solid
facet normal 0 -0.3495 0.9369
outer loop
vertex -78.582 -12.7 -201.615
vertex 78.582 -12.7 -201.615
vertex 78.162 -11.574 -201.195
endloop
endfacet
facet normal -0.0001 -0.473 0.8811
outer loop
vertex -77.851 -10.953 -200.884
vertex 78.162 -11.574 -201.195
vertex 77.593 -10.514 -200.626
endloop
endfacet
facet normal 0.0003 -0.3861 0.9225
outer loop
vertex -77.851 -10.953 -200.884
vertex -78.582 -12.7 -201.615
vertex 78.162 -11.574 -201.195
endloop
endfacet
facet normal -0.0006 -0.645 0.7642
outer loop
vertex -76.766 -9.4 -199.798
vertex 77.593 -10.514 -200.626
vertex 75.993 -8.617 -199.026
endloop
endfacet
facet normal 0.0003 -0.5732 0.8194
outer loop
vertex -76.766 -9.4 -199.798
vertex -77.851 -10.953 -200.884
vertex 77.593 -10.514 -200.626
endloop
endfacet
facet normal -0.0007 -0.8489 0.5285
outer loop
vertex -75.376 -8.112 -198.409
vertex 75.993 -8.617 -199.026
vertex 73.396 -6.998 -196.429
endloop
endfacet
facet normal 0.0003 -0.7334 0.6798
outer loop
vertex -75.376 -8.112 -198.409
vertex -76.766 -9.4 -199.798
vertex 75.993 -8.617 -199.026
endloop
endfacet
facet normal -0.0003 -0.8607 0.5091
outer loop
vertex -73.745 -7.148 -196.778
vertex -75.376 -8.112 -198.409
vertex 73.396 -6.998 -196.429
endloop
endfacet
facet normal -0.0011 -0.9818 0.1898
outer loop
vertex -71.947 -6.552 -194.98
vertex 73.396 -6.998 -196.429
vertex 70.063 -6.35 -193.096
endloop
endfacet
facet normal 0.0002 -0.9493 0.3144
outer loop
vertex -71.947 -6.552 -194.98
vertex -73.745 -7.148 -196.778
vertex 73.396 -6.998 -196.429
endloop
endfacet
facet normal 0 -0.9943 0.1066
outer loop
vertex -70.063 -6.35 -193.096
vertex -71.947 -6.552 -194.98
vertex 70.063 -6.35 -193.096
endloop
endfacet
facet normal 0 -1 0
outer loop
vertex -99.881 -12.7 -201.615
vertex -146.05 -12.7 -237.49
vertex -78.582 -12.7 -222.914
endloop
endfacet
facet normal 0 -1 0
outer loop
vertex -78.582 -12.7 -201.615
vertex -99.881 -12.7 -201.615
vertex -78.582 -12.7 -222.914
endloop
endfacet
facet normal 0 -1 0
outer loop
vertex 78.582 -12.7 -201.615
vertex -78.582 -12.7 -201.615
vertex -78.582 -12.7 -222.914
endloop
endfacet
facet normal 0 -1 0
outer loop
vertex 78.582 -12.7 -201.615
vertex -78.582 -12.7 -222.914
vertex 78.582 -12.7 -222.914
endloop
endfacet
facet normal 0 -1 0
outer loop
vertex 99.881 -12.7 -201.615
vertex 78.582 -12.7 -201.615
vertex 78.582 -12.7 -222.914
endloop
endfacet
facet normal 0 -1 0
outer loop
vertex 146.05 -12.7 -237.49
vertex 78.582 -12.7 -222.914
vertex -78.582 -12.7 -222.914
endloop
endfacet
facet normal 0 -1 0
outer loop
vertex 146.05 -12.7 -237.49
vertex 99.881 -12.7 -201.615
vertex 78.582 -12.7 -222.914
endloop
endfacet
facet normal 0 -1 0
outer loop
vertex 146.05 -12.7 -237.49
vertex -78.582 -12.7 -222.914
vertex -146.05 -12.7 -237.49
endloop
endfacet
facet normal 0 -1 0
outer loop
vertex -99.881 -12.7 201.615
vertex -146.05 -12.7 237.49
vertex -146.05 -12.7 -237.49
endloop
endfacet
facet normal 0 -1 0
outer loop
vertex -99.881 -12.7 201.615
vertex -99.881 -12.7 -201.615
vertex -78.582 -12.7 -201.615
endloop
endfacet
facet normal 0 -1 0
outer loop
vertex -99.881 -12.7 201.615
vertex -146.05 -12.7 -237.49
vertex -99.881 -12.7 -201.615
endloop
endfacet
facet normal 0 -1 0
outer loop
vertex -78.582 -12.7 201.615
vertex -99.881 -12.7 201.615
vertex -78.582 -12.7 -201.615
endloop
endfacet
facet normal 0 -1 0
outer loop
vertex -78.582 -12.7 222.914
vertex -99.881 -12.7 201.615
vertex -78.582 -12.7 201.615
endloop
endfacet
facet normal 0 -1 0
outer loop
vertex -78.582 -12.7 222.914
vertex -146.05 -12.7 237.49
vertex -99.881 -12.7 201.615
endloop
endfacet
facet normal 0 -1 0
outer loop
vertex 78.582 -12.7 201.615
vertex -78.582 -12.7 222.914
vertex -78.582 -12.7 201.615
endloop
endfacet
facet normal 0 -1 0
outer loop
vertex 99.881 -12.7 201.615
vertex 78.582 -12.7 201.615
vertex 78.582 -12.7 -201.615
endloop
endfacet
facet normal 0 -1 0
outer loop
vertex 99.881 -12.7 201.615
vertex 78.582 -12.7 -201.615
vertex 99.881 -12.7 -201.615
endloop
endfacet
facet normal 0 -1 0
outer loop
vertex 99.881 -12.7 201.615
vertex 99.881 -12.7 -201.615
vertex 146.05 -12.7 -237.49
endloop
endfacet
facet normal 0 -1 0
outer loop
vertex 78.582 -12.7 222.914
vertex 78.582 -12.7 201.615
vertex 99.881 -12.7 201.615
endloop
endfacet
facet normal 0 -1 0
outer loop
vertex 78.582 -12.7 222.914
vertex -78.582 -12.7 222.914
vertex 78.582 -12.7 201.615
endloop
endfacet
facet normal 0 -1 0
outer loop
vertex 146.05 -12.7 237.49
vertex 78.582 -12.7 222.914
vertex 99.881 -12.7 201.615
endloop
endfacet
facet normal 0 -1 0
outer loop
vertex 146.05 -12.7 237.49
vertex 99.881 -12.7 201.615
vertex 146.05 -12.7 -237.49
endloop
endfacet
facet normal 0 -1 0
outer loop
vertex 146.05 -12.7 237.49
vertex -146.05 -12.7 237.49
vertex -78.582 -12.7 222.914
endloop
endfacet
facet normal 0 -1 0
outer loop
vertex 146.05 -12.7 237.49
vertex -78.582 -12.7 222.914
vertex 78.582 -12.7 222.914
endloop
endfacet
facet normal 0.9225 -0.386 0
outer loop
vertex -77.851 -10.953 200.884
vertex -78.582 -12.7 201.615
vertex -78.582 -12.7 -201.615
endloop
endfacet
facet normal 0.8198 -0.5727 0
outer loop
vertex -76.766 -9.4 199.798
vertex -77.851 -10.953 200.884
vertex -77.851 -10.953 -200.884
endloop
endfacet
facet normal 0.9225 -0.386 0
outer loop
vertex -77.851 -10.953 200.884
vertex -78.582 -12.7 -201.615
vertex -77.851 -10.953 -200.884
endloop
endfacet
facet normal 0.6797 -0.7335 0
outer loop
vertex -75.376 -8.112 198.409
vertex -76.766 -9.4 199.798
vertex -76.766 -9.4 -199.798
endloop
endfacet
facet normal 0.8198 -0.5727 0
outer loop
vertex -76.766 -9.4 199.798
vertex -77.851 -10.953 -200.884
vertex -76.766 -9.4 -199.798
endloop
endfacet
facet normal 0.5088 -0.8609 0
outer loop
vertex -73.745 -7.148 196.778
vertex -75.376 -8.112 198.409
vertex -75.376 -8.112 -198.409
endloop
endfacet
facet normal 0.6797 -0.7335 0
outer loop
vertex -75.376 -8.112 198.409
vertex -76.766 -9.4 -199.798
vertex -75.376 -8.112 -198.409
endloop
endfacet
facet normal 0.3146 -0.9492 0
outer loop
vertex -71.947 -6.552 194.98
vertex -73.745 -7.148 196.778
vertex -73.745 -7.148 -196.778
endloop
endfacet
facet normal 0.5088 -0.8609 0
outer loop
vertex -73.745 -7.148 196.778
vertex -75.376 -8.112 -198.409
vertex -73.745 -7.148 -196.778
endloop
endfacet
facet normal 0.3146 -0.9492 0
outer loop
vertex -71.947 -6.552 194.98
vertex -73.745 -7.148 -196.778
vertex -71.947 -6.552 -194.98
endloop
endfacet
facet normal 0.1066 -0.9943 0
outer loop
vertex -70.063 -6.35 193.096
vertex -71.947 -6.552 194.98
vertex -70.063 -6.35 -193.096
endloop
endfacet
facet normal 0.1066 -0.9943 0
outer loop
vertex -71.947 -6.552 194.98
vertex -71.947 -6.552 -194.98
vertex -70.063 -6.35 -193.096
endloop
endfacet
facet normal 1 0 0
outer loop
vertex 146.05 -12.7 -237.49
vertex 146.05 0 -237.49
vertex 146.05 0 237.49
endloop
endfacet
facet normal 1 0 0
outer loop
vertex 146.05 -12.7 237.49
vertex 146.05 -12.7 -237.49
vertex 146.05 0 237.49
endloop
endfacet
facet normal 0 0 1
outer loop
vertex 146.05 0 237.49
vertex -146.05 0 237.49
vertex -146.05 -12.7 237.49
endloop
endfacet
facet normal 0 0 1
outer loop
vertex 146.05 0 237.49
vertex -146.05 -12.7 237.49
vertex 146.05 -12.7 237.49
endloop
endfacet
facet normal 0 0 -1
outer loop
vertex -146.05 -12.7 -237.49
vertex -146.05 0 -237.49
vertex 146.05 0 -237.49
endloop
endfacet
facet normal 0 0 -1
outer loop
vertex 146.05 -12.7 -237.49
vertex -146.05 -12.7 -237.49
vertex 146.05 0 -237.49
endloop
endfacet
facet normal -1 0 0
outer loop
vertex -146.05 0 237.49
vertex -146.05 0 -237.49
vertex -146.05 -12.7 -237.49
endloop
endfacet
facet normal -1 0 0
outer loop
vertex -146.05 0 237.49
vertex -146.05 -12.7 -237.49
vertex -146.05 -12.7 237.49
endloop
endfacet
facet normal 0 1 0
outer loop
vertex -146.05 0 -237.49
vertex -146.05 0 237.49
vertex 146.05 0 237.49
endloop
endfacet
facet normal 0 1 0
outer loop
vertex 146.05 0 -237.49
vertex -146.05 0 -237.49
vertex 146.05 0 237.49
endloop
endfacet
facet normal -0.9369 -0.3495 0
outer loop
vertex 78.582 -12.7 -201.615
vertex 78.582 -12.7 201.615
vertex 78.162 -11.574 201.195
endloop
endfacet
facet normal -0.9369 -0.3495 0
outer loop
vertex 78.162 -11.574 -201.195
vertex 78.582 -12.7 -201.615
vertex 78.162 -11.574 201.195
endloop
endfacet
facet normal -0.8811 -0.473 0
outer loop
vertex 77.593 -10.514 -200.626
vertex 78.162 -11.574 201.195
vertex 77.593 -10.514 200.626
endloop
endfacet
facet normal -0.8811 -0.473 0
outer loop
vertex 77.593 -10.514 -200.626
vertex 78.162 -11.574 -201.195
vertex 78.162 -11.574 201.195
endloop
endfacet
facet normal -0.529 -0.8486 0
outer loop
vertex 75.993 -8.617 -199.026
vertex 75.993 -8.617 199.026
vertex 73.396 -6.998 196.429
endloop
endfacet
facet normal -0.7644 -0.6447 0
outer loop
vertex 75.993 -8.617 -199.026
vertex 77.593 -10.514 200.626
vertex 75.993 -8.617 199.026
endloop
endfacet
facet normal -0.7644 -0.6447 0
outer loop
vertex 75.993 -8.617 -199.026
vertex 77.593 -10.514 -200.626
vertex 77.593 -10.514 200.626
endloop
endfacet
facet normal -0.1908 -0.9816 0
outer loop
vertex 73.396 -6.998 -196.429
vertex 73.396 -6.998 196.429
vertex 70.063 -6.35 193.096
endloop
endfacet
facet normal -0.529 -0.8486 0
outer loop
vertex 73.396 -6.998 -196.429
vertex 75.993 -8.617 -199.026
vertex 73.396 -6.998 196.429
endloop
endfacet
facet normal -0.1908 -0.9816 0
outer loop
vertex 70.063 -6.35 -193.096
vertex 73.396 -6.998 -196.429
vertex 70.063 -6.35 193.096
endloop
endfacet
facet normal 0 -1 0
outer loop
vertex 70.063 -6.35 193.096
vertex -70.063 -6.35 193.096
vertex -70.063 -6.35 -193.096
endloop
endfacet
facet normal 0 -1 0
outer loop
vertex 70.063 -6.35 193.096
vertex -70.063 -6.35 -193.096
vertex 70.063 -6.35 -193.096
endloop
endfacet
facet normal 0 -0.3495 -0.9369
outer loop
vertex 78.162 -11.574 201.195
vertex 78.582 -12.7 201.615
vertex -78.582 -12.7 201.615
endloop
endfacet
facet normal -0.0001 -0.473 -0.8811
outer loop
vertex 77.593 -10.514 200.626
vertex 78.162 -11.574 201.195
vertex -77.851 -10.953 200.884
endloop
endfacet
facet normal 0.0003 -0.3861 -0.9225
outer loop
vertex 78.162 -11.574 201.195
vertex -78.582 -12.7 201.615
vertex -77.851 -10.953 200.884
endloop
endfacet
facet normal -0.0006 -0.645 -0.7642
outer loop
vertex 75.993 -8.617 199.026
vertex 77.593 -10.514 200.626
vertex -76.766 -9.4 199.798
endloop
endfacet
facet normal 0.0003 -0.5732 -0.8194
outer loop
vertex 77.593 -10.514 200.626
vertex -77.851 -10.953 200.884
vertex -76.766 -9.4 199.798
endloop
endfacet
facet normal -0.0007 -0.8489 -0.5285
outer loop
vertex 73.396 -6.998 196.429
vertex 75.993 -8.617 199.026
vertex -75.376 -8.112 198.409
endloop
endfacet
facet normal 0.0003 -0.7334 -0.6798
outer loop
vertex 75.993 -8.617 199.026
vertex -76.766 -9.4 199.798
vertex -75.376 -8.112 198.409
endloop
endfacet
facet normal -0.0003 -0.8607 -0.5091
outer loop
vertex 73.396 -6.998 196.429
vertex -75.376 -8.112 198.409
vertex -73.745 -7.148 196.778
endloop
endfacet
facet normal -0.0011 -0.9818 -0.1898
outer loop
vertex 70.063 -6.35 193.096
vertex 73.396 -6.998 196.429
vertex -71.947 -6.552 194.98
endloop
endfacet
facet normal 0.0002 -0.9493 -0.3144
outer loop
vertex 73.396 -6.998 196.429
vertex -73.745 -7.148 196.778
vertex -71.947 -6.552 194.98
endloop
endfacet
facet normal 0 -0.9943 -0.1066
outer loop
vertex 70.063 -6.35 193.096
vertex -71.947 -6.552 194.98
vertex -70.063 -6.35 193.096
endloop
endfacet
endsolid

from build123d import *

# Parameters (mm, degrees)
F0_W        = 292.1
F0_H        = 474.98
F1_DEPTH    = 12.7
F2_W        = 157.1649909019
F2_H        = 403.2308459282
F3_DEPTH    = 6.35
F4_T1_DEPTH = 445.8279408996
F4_T3_DEPTH = 199.7620858733


# Not quite as in the source:
# - a fillet or chamfer that OpenCascade refuses, or shapes differently, is made with other operations: its cross-section is extruded or revolved along the edge and cut away or added


with BuildPart() as f1:
    # F0 (on Front) → F1 (new body)
    with BuildSketch(Plane.XZ):
        Rectangle(F0_W, F0_H)
    extrude(amount=F1_DEPTH)

    # F2 (on face) → F3 (cut)
    with BuildSketch(Plane.XZ.offset(12.7)):
        Rectangle(F2_W, F2_H)
    extrude(amount=-F3_DEPTH, mode=Mode.SUBTRACT)

    # F4: fillet of radius 8.89 on 4 edges, made by hand

    # F4_s2 → F4_t1 (join)
    with BuildSketch(Plane.XY.offset(-222.9139704498)):
        with BuildLine():
            ThreePointArc((78.582495451, -12.7), (75.3758676252, -8.1121426782), (70.0630764567, -6.35))
            Line((70.0630764567, -6.35), (78.582495451, -6.35))
            Line((78.582495451, -6.35), (78.582495451, -12.7))
        make_face()
        with BuildLine():
            ThreePointArc((-78.582495451, -12.7), (-75.3758676252, -8.1121426782), (-70.0630764567, -6.35))
            Line((-70.0630764567, -6.35), (-78.582495451, -6.35))
            Line((-78.582495451, -6.35), (-78.582495451, -12.7))
        make_face()
    extrude(amount=F4_T1_DEPTH)

    # F4_s4 → F4_t3 (join)
    with BuildSketch(Plane.YZ.offset(-99.8810429367)):
        with BuildLine():
            ThreePointArc((-12.7, 201.6154229641), (-8.1121426782, 198.4087951383), (-6.35, 193.0960039698))
            Line((-6.35, 193.0960039698), (-6.35, 201.6154229641))
            Line((-6.35, 201.6154229641), (-12.7, 201.6154229641))
        make_face()
        with BuildLine():
            ThreePointArc((-12.7, -201.6154229641), (-8.1121426782, -198.4087951383), (-6.35, -193.0960039698))
            Line((-6.35, -193.0960039698), (-6.35, -201.6154229641))
            Line((-6.35, -201.6154229641), (-12.7, -201.6154229641))
        make_face()
    extrude(amount=F4_T3_DEPTH)


solid = f1.part
